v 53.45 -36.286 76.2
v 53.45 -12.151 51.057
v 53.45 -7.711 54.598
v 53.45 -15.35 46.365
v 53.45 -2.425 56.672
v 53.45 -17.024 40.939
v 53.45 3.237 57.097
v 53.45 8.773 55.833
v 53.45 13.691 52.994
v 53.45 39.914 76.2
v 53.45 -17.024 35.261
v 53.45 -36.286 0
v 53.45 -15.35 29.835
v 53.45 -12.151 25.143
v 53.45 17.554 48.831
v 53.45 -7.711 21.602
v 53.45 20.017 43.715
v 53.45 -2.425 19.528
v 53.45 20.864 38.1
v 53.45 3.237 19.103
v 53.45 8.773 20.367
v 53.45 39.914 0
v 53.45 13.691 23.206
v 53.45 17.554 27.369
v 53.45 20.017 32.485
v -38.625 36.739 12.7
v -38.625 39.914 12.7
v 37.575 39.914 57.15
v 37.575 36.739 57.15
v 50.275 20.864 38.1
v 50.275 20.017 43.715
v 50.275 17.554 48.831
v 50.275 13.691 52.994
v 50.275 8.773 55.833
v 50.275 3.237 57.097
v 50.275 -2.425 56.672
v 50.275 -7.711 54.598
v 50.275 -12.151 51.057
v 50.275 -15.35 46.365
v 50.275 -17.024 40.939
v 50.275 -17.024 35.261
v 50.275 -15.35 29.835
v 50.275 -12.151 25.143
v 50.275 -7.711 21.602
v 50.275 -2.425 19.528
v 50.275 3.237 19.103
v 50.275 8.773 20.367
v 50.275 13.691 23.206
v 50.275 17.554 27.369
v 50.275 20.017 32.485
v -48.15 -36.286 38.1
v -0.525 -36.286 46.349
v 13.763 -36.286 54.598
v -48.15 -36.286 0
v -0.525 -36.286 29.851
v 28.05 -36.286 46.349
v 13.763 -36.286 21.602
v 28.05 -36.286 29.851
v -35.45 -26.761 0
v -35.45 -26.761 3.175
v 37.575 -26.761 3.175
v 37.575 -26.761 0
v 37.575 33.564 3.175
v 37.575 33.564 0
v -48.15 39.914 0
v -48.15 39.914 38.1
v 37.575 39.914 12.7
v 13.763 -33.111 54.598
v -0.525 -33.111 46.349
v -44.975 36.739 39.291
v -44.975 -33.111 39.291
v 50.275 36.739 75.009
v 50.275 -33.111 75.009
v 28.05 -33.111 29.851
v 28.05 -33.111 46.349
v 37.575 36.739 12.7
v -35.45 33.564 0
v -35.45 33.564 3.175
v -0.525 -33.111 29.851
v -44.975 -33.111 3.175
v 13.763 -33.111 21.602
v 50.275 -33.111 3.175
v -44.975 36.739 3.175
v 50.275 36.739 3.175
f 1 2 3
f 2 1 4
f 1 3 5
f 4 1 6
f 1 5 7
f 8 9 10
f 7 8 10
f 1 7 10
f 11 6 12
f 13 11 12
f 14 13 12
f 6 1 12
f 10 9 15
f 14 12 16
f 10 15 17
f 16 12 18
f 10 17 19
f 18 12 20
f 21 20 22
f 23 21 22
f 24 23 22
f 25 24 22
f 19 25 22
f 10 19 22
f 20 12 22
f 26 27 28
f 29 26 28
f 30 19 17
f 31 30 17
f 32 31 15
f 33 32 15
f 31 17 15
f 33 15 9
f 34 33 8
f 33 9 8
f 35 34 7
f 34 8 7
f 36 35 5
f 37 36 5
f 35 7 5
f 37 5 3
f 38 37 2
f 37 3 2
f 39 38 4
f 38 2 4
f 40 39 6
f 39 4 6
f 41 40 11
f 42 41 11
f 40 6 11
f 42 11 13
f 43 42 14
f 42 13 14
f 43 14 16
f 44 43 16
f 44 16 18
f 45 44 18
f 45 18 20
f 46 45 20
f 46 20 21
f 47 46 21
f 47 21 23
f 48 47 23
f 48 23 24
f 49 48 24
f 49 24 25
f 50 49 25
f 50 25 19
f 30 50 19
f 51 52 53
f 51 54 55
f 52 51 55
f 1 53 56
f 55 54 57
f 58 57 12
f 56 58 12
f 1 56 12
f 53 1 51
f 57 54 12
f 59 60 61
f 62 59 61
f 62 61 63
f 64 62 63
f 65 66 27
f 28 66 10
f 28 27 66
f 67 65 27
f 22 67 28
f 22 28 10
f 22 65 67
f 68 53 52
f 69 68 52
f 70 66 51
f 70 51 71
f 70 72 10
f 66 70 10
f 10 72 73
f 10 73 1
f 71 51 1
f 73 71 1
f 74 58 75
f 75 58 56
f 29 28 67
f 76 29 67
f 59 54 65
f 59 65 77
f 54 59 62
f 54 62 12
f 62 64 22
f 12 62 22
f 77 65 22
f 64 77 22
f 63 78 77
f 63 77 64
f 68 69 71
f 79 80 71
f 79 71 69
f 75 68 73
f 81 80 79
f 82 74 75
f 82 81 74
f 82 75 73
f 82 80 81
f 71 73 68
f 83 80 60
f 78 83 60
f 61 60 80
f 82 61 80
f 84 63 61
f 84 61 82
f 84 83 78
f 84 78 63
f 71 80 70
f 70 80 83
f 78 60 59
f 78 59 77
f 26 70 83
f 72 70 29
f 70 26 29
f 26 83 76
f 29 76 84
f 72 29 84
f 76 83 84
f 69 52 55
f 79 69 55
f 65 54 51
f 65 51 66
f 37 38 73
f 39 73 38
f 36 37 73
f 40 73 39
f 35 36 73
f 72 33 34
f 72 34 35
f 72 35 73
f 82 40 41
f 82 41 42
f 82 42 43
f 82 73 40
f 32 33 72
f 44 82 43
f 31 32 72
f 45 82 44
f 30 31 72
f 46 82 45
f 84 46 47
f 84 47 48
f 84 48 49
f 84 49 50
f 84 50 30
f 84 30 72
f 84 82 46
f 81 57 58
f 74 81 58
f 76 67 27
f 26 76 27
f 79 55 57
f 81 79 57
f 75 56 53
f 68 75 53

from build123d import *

# Parameters (mm, degrees)
F0_W      = 101.6
F0_H      = 76.2
F1_DEPTH  = 3.175
F2_W      = 101.6
F2_H      = 76.2
F2_W_2    = 95.25
F2_H_2    = 69.85
F3_DEPTH  = 73.025
F5_DEPTH  = 76.201
F6_R      = 19.05
F7_DEPTH  = 25.4
F8_W      = 73.025
F8_H      = 60.325
F9_DEPTH  = 3.176
F11_DEPTH = 25.4
F13_DEPTH = 25.4


with BuildPart() as f1:
    # F0 (on Top) → F1 (new body)
    with BuildSketch(Plane.XY):
        with Locations((2.650434, 1.813662)):
            Rectangle(F0_W, F0_H)
    extrude(amount=F1_DEPTH)

    # F2 (on face) → F3 (join)
    with BuildSketch(Plane.XY.offset(3.175)):
        with Locations((2.650434, 1.813662)):
            Rectangle(F2_W, F2_H)
        with Locations((2.650434, 1.813662)):
            Rectangle(F2_W_2, F2_H_2, mode=Mode.SUBTRACT)
    extrude(amount=F3_DEPTH)

    # F4 (on face) → F5 (cut, through all)
    with BuildSketch(Plane.XZ.offset(36.286338)):
        Polygon((-48.149566, 76.2), (-48.149566, 38.1), (53.450434, 76.2), align=None)
    extrude(amount=-F5_DEPTH, mode=Mode.SUBTRACT)

    # F6 (on face) → F7 (cut)
    with BuildSketch(Plane.YZ.offset(53.450434)):
        with Locations((1.813662, 38.1)):
            Circle(F6_R)
    extrude(amount=-F7_DEPTH, mode=Mode.SUBTRACT)

    # F8 (on face) → F9 (cut, through all)
    with BuildSketch(Plane.XY.offset(3.175)):
        with Locations((1.062934, 3.401162)):
            Rectangle(F8_W, F8_H)
    extrude(amount=-F9_DEPTH, mode=Mode.SUBTRACT)

    # F10 (on face) → F11 (cut)
    with BuildSketch(Plane.XZ.offset(36.286338)):
        Polygon((28.050434, 29.851108), (28.050434, 46.348892), (13.762934, 54.597784), (-0.524566, 46.348892), (-0.524566, 29.851108), (13.762934, 21.602216), align=None)
    extrude(amount=-F11_DEPTH, mode=Mode.SUBTRACT)

    # F12 (on face) → F13 (cut)
    with BuildSketch(Plane(origin=(0, 39.913662, 0), x_dir=(-1, 0, 0), z_dir=(0, 1, 0))):
        Polygon((38.624566, 12.7), (-37.575434, 57.15), (-37.575434, 12.7), align=None)
    extrude(amount=-F13_DEPTH, mode=Mode.SUBTRACT)


solid = f1.part
